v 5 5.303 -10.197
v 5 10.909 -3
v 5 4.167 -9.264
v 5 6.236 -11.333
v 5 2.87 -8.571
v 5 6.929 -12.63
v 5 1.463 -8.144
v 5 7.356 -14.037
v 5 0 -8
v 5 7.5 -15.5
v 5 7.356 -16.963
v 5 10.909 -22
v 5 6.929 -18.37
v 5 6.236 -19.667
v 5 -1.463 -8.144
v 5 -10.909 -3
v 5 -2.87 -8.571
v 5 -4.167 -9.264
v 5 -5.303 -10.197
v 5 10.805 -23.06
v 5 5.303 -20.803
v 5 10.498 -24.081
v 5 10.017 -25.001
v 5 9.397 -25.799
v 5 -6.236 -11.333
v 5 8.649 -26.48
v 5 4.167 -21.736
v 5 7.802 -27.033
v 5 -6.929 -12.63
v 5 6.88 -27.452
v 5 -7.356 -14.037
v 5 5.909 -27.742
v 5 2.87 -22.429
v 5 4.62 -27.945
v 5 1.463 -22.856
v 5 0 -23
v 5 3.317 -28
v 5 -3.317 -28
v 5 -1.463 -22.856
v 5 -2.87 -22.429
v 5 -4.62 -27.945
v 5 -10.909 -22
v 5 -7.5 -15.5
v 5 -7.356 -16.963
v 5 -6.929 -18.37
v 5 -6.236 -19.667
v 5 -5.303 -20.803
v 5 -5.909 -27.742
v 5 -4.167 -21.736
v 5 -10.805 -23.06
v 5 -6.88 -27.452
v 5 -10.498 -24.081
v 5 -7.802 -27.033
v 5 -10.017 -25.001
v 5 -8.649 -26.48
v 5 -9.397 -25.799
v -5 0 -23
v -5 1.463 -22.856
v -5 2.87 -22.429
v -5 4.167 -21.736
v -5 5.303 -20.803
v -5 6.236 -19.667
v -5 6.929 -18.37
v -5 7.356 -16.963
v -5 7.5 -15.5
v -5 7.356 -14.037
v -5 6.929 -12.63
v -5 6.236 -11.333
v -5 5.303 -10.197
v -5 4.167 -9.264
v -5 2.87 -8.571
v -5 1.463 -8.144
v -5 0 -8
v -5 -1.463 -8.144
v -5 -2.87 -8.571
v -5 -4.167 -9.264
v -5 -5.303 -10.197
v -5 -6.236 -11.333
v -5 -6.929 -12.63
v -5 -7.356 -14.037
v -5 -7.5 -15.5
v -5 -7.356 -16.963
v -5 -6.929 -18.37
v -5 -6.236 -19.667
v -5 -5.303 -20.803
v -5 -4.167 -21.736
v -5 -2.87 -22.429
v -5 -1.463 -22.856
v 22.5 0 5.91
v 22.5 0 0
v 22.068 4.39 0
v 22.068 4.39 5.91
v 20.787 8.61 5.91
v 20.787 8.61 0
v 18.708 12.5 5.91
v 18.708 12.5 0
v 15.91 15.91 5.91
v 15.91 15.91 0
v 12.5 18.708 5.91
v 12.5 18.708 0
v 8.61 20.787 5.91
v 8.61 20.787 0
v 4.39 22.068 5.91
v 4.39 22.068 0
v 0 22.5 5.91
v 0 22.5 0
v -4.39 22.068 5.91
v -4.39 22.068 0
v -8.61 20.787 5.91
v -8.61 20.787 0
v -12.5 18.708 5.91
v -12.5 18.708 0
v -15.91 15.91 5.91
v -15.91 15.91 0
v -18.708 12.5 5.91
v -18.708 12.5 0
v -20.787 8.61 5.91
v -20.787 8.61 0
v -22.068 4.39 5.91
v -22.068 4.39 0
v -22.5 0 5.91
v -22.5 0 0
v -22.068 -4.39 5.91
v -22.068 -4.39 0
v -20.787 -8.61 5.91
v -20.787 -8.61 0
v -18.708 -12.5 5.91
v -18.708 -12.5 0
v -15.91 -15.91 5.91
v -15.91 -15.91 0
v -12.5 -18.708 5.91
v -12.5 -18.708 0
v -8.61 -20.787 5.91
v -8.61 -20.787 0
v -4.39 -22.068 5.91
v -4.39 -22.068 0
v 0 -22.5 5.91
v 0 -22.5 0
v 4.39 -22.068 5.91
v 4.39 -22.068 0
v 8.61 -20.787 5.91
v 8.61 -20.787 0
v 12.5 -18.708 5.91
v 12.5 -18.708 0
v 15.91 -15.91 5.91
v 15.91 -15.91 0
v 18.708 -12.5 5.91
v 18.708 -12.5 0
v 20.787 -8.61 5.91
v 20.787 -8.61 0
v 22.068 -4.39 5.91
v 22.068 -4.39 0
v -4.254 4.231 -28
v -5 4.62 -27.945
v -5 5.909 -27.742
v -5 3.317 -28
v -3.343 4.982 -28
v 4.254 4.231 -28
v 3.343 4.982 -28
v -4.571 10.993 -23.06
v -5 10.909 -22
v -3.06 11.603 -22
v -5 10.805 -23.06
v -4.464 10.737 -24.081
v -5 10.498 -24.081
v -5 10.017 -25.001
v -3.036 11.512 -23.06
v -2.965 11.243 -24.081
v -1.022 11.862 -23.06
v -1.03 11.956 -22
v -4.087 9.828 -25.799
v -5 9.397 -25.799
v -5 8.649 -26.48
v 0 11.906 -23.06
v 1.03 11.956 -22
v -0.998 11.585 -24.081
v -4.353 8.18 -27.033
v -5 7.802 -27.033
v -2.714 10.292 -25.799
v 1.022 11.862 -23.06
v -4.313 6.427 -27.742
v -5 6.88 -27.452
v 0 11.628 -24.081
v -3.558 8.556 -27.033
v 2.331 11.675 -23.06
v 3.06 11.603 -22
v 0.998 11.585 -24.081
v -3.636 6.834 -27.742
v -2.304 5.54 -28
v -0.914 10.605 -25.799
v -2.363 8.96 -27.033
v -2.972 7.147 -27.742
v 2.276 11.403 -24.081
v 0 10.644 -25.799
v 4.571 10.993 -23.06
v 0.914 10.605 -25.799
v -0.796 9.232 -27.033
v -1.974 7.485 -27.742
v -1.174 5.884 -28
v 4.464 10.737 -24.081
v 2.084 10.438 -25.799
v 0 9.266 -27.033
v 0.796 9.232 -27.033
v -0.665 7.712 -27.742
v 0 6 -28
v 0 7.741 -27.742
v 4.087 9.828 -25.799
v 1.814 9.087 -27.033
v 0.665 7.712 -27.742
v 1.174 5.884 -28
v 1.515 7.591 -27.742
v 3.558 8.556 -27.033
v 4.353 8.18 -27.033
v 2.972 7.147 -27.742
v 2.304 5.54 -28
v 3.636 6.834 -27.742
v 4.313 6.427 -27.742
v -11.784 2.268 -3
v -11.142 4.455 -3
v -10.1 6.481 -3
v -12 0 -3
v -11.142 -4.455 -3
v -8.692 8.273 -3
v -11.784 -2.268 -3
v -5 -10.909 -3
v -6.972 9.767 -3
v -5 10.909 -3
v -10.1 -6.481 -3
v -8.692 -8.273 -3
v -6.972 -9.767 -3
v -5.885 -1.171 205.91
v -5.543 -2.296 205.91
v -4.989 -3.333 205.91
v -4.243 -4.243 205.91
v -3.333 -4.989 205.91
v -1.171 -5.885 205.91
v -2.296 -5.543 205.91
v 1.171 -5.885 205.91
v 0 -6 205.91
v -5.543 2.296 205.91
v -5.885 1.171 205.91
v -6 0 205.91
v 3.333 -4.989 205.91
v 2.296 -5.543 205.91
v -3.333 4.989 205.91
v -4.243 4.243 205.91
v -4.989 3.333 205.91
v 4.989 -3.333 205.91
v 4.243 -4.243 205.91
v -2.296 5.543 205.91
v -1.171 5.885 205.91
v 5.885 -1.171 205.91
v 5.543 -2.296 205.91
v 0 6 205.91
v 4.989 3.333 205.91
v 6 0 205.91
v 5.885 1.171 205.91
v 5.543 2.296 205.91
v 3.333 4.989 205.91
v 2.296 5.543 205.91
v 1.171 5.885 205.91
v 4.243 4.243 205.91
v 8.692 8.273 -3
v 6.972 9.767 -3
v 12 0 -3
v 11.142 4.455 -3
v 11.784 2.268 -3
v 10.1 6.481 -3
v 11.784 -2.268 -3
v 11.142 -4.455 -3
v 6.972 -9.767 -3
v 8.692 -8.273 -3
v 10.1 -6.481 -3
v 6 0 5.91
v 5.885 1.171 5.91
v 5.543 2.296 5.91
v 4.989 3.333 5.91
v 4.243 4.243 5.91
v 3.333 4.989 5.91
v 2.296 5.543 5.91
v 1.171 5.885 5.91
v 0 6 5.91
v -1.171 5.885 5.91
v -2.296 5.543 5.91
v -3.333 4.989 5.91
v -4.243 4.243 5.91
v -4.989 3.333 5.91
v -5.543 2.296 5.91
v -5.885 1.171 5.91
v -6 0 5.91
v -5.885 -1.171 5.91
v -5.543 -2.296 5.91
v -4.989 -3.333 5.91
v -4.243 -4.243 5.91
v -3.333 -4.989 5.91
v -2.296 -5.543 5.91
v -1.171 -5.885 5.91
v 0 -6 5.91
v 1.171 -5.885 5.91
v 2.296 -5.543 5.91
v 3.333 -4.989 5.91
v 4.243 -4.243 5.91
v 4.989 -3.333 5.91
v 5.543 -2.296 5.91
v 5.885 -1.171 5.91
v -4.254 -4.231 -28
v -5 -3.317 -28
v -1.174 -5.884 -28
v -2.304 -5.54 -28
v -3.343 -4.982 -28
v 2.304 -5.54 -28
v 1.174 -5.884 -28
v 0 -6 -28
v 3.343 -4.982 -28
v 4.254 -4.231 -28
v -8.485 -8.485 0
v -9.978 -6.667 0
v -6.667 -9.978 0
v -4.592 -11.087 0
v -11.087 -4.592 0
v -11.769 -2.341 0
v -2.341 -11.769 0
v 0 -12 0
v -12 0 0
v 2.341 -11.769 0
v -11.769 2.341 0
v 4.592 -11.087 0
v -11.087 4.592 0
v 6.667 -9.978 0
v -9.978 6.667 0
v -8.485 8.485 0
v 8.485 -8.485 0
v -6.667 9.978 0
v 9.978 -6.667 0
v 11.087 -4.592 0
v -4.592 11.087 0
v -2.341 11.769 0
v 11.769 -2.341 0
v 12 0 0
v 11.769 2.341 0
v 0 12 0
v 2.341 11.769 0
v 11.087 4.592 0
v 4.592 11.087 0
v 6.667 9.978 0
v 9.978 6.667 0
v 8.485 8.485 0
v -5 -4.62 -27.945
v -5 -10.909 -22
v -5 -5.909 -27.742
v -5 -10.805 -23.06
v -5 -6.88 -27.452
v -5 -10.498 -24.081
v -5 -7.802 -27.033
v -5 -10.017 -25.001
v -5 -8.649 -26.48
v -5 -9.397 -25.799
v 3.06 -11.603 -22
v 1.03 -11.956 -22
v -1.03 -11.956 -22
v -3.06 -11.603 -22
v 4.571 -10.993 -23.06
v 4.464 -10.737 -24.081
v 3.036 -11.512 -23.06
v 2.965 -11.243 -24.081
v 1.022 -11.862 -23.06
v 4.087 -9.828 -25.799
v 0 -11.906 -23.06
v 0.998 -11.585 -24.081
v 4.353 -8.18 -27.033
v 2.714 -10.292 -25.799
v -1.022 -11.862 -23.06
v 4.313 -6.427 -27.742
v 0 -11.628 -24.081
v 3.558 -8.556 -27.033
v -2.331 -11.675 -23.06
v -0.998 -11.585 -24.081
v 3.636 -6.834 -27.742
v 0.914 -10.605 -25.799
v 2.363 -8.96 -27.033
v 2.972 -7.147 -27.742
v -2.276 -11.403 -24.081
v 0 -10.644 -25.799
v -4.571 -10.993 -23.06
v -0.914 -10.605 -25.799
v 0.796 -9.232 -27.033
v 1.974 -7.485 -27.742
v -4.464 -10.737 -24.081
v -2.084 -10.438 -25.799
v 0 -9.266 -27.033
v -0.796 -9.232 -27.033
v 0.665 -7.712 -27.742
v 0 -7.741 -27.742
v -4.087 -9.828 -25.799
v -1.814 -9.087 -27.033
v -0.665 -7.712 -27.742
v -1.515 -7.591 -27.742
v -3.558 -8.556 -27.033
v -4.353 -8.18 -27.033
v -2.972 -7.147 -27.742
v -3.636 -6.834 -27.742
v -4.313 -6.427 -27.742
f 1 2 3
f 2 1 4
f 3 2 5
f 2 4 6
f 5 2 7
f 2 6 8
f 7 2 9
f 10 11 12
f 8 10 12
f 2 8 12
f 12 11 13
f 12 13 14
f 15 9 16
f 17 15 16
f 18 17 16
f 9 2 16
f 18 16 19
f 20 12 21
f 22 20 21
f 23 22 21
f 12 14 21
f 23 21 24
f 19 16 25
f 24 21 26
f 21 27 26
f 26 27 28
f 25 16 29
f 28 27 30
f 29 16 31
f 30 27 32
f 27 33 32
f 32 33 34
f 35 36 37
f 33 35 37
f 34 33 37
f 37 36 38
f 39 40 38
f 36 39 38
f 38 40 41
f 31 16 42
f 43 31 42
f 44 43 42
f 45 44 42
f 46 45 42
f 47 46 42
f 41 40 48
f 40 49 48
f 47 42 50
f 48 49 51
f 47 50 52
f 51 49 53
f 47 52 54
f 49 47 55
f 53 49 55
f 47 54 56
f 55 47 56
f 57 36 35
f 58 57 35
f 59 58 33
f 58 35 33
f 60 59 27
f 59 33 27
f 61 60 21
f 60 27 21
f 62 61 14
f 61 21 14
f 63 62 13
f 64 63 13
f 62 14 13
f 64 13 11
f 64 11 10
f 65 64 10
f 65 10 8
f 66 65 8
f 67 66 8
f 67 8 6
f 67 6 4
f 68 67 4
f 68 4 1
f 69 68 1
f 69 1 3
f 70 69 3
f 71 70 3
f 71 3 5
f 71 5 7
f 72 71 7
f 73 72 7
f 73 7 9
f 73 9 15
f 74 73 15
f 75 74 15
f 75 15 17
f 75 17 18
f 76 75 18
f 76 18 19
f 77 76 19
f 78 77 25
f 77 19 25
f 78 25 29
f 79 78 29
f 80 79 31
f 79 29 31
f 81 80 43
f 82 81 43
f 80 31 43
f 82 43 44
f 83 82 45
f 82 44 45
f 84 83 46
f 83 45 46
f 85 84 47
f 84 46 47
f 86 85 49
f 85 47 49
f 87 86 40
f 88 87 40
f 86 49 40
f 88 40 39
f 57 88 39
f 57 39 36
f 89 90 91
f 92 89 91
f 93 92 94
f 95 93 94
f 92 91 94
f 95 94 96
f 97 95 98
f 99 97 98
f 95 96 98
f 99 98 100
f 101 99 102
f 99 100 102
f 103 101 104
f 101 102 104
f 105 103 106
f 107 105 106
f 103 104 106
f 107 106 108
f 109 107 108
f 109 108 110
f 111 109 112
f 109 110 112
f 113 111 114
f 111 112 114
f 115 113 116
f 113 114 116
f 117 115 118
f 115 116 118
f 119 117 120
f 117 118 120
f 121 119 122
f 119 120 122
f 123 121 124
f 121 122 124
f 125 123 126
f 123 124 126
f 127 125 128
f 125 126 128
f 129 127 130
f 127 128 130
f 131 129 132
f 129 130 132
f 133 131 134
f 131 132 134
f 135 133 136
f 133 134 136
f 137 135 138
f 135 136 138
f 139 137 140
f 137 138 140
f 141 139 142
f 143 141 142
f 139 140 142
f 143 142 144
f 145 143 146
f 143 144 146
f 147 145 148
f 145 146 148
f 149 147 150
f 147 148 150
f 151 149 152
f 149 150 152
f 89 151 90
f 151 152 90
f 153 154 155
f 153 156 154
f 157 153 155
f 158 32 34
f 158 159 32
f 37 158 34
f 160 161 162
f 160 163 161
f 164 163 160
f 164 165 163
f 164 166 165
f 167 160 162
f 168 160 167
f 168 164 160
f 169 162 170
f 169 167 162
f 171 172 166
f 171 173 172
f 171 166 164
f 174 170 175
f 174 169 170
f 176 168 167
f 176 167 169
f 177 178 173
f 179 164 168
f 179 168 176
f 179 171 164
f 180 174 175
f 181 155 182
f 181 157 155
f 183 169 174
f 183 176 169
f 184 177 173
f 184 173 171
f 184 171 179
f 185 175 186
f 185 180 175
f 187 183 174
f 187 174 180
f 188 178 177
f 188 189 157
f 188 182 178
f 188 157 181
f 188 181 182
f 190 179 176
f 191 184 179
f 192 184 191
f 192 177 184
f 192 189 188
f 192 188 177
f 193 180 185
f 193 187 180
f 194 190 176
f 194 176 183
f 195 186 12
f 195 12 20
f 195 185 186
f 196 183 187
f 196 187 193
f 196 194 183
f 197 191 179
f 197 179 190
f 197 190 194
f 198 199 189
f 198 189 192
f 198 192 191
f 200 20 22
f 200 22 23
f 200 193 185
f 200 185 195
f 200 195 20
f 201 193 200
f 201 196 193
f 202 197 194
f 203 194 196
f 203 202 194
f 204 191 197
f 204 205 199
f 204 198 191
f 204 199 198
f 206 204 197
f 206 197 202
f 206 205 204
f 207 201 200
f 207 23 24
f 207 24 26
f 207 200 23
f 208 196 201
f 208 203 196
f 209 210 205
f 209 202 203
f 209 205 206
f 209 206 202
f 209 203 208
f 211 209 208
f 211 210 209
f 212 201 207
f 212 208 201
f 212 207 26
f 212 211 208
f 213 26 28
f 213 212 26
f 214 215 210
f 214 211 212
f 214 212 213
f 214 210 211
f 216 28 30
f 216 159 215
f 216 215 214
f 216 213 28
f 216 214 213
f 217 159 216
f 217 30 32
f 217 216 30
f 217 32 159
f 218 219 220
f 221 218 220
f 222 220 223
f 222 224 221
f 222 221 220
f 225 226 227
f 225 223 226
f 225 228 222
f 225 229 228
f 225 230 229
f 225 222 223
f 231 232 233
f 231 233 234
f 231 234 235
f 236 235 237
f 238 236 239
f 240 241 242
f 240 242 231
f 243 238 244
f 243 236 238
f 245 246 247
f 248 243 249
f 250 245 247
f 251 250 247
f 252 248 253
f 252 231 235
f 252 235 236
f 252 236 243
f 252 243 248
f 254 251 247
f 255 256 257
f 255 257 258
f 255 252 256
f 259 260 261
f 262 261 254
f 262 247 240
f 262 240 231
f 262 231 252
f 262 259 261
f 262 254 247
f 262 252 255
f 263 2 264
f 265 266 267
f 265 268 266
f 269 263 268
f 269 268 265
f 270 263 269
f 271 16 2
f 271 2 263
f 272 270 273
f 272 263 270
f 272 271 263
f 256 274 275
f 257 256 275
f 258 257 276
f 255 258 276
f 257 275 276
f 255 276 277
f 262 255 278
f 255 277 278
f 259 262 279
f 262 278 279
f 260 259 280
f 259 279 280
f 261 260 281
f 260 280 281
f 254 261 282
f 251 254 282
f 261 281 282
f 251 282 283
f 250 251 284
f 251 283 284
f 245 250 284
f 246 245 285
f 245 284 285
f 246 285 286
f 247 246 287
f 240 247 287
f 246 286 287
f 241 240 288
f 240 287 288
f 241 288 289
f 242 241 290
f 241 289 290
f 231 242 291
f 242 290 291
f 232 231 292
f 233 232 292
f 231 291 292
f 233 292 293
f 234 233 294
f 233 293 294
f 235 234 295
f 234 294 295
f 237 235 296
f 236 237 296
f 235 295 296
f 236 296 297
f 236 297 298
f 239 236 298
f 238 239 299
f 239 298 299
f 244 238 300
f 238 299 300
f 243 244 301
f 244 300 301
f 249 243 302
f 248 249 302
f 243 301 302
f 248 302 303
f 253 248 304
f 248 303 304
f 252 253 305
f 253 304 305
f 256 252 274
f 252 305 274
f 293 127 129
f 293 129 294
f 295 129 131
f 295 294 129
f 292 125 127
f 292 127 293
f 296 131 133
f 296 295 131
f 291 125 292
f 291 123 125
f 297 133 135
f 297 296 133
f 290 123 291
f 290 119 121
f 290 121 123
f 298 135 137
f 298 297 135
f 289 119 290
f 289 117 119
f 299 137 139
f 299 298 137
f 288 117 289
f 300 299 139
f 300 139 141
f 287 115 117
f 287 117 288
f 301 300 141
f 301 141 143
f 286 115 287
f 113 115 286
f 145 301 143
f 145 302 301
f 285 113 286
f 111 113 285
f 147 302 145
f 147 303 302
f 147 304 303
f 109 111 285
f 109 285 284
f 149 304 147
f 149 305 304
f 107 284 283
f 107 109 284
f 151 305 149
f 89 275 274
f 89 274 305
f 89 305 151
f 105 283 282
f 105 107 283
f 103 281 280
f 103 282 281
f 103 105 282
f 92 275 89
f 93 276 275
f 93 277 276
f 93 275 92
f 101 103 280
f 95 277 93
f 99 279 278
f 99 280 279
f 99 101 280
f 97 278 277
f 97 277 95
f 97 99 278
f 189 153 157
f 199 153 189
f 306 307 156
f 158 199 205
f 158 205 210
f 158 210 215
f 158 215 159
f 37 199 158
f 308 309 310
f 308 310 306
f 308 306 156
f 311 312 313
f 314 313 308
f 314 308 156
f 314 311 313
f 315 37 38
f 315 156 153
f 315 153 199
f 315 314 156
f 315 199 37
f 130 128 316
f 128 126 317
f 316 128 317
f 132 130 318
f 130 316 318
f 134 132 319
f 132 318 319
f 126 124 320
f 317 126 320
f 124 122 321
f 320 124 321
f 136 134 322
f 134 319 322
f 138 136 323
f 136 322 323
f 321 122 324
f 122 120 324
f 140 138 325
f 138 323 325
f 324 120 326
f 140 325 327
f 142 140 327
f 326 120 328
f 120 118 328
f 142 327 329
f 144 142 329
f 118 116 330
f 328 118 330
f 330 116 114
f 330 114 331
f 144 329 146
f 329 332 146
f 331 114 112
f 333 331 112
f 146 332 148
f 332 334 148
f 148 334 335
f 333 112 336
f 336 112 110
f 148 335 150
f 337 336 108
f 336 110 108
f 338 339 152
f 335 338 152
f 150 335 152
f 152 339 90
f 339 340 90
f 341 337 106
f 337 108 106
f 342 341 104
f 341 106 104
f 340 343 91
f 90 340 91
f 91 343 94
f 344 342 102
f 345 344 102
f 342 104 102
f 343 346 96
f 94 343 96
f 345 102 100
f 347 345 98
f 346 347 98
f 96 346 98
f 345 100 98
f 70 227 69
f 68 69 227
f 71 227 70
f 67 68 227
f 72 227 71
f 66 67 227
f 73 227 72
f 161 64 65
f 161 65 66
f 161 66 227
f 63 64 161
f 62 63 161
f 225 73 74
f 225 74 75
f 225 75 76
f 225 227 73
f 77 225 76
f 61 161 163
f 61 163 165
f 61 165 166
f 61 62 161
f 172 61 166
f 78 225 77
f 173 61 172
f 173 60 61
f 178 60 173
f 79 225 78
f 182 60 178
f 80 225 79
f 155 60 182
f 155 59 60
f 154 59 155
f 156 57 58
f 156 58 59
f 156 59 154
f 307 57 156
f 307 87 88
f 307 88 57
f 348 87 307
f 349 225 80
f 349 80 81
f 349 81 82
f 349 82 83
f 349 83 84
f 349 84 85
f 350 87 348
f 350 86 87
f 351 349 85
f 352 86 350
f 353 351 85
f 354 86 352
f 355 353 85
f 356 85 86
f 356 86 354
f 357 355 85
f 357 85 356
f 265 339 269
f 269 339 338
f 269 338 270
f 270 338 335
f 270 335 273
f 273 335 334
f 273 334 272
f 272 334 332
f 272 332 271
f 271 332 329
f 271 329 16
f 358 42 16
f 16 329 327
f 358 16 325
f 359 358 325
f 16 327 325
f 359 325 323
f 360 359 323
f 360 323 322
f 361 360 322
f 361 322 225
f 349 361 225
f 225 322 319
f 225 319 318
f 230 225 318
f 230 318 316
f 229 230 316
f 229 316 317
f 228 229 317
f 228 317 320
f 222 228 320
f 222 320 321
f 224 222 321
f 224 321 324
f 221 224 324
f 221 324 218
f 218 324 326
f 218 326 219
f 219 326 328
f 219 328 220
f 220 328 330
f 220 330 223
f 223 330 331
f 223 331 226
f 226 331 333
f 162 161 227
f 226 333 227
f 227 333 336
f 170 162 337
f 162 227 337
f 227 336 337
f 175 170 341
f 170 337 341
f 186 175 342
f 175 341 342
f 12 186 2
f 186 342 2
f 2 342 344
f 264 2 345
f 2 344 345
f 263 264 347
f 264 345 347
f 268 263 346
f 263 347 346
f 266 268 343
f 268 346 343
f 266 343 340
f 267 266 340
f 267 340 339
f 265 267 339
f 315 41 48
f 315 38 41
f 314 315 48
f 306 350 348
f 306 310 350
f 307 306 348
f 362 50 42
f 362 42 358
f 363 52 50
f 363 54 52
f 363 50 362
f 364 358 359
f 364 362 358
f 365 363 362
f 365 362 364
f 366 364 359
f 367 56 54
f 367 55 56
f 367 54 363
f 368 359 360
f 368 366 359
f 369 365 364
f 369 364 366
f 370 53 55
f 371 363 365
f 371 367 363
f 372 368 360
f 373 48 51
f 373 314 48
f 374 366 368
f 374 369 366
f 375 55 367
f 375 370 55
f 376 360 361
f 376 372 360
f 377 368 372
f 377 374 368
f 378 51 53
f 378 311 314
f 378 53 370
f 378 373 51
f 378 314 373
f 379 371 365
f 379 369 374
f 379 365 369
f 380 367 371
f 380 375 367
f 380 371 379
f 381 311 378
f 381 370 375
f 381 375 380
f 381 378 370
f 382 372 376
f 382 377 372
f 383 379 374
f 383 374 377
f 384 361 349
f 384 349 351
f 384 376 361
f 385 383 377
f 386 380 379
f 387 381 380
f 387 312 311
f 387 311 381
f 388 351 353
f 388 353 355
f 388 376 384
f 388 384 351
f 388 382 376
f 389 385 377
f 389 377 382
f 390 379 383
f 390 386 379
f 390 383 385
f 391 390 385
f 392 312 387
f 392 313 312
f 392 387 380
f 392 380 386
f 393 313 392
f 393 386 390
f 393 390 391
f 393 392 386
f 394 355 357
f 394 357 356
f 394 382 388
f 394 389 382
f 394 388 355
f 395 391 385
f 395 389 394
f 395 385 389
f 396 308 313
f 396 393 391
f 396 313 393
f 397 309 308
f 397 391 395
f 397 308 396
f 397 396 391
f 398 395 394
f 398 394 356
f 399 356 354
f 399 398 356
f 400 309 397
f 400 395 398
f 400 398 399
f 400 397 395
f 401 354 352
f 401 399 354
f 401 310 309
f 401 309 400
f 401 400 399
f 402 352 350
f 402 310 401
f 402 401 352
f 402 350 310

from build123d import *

# Parameters (mm, degrees)
SKETCH1_R               = 22.5
BOSS_EXTRUDE1_DEPTH     = 5.91
SKETCH2_R               = 6
BOSS_EXTRUDE2_DEPTH     = 200
SKETCH3_R               = 12
BOSS_EXTRUDE3_DEPTH     = 28
FILLET1_R               = 6
CUT_EXTRUDE1_DEPTH      = 209.354093072
CUT_EXTRUDE1_DEPTH_BACK = 209.354093072
SKETCH4_W               = 21.071752118
SKETCH4_H               = 26
SKETCH5_R               = 7.5
CUT_EXTRUDE2_DEPTH      = 209.953172027


with BuildPart() as part:
    # Sketch1 → Boss-Extrude1 (new body)
    with BuildSketch(Plane.XY):
        Circle(SKETCH1_R)
    extrude(amount=BOSS_EXTRUDE1_DEPTH)

    # Sketch2 → Boss-Extrude2 (add)
    with BuildSketch(Plane.XY.offset(5.91)):
        Circle(SKETCH2_R)
    extrude(amount=BOSS_EXTRUDE2_DEPTH)

    # Sketch3 → Boss-Extrude3 (add)
    with BuildSketch(Plane(origin=(0, 0, 0), x_dir=(-1, 0, 0), z_dir=(0, 0, -1))):
        with Locations(Location((0, 0, 0), (0, 0, 180))):
            Circle(SKETCH3_R)
    extrude(amount=BOSS_EXTRUDE3_DEPTH)

    # Fillet1
    fillet1_edges = [part.edges().sort_by_distance(p)[0] for p in [
        (-12, 0, -28),
    ]]
    fillet(fillet1_edges, radius=FILLET1_R)

    # Sketch4 → Cut-Extrude1 (cut, two sides: drawn at the far end of the back side and taken through both)
    with BuildSketch(Plane(origin=(0, 0, 0), x_dir=(1, 0, 0), z_dir=(0, 1, 0)).offset(-CUT_EXTRUDE1_DEPTH_BACK)):
        with Locations((-15.535876059, 16)):
            Rectangle(SKETCH4_W, SKETCH4_H)
        with Locations((15.535876059, 16)):
            Rectangle(SKETCH4_W, SKETCH4_H)
    extrude(amount=CUT_EXTRUDE1_DEPTH + CUT_EXTRUDE1_DEPTH_BACK, mode=Mode.SUBTRACT)

    # Sketch5 → Cut-Extrude2 (cut, through all)
    with BuildSketch(Plane(origin=(5, 0, 0), x_dir=(0, 0, -1), z_dir=(1, 0, 0))):
        with Locations((15.5, 0)):
            Circle(SKETCH5_R)
    extrude(amount=-CUT_EXTRUDE2_DEPTH, mode=Mode.SUBTRACT)


solid = part.part
